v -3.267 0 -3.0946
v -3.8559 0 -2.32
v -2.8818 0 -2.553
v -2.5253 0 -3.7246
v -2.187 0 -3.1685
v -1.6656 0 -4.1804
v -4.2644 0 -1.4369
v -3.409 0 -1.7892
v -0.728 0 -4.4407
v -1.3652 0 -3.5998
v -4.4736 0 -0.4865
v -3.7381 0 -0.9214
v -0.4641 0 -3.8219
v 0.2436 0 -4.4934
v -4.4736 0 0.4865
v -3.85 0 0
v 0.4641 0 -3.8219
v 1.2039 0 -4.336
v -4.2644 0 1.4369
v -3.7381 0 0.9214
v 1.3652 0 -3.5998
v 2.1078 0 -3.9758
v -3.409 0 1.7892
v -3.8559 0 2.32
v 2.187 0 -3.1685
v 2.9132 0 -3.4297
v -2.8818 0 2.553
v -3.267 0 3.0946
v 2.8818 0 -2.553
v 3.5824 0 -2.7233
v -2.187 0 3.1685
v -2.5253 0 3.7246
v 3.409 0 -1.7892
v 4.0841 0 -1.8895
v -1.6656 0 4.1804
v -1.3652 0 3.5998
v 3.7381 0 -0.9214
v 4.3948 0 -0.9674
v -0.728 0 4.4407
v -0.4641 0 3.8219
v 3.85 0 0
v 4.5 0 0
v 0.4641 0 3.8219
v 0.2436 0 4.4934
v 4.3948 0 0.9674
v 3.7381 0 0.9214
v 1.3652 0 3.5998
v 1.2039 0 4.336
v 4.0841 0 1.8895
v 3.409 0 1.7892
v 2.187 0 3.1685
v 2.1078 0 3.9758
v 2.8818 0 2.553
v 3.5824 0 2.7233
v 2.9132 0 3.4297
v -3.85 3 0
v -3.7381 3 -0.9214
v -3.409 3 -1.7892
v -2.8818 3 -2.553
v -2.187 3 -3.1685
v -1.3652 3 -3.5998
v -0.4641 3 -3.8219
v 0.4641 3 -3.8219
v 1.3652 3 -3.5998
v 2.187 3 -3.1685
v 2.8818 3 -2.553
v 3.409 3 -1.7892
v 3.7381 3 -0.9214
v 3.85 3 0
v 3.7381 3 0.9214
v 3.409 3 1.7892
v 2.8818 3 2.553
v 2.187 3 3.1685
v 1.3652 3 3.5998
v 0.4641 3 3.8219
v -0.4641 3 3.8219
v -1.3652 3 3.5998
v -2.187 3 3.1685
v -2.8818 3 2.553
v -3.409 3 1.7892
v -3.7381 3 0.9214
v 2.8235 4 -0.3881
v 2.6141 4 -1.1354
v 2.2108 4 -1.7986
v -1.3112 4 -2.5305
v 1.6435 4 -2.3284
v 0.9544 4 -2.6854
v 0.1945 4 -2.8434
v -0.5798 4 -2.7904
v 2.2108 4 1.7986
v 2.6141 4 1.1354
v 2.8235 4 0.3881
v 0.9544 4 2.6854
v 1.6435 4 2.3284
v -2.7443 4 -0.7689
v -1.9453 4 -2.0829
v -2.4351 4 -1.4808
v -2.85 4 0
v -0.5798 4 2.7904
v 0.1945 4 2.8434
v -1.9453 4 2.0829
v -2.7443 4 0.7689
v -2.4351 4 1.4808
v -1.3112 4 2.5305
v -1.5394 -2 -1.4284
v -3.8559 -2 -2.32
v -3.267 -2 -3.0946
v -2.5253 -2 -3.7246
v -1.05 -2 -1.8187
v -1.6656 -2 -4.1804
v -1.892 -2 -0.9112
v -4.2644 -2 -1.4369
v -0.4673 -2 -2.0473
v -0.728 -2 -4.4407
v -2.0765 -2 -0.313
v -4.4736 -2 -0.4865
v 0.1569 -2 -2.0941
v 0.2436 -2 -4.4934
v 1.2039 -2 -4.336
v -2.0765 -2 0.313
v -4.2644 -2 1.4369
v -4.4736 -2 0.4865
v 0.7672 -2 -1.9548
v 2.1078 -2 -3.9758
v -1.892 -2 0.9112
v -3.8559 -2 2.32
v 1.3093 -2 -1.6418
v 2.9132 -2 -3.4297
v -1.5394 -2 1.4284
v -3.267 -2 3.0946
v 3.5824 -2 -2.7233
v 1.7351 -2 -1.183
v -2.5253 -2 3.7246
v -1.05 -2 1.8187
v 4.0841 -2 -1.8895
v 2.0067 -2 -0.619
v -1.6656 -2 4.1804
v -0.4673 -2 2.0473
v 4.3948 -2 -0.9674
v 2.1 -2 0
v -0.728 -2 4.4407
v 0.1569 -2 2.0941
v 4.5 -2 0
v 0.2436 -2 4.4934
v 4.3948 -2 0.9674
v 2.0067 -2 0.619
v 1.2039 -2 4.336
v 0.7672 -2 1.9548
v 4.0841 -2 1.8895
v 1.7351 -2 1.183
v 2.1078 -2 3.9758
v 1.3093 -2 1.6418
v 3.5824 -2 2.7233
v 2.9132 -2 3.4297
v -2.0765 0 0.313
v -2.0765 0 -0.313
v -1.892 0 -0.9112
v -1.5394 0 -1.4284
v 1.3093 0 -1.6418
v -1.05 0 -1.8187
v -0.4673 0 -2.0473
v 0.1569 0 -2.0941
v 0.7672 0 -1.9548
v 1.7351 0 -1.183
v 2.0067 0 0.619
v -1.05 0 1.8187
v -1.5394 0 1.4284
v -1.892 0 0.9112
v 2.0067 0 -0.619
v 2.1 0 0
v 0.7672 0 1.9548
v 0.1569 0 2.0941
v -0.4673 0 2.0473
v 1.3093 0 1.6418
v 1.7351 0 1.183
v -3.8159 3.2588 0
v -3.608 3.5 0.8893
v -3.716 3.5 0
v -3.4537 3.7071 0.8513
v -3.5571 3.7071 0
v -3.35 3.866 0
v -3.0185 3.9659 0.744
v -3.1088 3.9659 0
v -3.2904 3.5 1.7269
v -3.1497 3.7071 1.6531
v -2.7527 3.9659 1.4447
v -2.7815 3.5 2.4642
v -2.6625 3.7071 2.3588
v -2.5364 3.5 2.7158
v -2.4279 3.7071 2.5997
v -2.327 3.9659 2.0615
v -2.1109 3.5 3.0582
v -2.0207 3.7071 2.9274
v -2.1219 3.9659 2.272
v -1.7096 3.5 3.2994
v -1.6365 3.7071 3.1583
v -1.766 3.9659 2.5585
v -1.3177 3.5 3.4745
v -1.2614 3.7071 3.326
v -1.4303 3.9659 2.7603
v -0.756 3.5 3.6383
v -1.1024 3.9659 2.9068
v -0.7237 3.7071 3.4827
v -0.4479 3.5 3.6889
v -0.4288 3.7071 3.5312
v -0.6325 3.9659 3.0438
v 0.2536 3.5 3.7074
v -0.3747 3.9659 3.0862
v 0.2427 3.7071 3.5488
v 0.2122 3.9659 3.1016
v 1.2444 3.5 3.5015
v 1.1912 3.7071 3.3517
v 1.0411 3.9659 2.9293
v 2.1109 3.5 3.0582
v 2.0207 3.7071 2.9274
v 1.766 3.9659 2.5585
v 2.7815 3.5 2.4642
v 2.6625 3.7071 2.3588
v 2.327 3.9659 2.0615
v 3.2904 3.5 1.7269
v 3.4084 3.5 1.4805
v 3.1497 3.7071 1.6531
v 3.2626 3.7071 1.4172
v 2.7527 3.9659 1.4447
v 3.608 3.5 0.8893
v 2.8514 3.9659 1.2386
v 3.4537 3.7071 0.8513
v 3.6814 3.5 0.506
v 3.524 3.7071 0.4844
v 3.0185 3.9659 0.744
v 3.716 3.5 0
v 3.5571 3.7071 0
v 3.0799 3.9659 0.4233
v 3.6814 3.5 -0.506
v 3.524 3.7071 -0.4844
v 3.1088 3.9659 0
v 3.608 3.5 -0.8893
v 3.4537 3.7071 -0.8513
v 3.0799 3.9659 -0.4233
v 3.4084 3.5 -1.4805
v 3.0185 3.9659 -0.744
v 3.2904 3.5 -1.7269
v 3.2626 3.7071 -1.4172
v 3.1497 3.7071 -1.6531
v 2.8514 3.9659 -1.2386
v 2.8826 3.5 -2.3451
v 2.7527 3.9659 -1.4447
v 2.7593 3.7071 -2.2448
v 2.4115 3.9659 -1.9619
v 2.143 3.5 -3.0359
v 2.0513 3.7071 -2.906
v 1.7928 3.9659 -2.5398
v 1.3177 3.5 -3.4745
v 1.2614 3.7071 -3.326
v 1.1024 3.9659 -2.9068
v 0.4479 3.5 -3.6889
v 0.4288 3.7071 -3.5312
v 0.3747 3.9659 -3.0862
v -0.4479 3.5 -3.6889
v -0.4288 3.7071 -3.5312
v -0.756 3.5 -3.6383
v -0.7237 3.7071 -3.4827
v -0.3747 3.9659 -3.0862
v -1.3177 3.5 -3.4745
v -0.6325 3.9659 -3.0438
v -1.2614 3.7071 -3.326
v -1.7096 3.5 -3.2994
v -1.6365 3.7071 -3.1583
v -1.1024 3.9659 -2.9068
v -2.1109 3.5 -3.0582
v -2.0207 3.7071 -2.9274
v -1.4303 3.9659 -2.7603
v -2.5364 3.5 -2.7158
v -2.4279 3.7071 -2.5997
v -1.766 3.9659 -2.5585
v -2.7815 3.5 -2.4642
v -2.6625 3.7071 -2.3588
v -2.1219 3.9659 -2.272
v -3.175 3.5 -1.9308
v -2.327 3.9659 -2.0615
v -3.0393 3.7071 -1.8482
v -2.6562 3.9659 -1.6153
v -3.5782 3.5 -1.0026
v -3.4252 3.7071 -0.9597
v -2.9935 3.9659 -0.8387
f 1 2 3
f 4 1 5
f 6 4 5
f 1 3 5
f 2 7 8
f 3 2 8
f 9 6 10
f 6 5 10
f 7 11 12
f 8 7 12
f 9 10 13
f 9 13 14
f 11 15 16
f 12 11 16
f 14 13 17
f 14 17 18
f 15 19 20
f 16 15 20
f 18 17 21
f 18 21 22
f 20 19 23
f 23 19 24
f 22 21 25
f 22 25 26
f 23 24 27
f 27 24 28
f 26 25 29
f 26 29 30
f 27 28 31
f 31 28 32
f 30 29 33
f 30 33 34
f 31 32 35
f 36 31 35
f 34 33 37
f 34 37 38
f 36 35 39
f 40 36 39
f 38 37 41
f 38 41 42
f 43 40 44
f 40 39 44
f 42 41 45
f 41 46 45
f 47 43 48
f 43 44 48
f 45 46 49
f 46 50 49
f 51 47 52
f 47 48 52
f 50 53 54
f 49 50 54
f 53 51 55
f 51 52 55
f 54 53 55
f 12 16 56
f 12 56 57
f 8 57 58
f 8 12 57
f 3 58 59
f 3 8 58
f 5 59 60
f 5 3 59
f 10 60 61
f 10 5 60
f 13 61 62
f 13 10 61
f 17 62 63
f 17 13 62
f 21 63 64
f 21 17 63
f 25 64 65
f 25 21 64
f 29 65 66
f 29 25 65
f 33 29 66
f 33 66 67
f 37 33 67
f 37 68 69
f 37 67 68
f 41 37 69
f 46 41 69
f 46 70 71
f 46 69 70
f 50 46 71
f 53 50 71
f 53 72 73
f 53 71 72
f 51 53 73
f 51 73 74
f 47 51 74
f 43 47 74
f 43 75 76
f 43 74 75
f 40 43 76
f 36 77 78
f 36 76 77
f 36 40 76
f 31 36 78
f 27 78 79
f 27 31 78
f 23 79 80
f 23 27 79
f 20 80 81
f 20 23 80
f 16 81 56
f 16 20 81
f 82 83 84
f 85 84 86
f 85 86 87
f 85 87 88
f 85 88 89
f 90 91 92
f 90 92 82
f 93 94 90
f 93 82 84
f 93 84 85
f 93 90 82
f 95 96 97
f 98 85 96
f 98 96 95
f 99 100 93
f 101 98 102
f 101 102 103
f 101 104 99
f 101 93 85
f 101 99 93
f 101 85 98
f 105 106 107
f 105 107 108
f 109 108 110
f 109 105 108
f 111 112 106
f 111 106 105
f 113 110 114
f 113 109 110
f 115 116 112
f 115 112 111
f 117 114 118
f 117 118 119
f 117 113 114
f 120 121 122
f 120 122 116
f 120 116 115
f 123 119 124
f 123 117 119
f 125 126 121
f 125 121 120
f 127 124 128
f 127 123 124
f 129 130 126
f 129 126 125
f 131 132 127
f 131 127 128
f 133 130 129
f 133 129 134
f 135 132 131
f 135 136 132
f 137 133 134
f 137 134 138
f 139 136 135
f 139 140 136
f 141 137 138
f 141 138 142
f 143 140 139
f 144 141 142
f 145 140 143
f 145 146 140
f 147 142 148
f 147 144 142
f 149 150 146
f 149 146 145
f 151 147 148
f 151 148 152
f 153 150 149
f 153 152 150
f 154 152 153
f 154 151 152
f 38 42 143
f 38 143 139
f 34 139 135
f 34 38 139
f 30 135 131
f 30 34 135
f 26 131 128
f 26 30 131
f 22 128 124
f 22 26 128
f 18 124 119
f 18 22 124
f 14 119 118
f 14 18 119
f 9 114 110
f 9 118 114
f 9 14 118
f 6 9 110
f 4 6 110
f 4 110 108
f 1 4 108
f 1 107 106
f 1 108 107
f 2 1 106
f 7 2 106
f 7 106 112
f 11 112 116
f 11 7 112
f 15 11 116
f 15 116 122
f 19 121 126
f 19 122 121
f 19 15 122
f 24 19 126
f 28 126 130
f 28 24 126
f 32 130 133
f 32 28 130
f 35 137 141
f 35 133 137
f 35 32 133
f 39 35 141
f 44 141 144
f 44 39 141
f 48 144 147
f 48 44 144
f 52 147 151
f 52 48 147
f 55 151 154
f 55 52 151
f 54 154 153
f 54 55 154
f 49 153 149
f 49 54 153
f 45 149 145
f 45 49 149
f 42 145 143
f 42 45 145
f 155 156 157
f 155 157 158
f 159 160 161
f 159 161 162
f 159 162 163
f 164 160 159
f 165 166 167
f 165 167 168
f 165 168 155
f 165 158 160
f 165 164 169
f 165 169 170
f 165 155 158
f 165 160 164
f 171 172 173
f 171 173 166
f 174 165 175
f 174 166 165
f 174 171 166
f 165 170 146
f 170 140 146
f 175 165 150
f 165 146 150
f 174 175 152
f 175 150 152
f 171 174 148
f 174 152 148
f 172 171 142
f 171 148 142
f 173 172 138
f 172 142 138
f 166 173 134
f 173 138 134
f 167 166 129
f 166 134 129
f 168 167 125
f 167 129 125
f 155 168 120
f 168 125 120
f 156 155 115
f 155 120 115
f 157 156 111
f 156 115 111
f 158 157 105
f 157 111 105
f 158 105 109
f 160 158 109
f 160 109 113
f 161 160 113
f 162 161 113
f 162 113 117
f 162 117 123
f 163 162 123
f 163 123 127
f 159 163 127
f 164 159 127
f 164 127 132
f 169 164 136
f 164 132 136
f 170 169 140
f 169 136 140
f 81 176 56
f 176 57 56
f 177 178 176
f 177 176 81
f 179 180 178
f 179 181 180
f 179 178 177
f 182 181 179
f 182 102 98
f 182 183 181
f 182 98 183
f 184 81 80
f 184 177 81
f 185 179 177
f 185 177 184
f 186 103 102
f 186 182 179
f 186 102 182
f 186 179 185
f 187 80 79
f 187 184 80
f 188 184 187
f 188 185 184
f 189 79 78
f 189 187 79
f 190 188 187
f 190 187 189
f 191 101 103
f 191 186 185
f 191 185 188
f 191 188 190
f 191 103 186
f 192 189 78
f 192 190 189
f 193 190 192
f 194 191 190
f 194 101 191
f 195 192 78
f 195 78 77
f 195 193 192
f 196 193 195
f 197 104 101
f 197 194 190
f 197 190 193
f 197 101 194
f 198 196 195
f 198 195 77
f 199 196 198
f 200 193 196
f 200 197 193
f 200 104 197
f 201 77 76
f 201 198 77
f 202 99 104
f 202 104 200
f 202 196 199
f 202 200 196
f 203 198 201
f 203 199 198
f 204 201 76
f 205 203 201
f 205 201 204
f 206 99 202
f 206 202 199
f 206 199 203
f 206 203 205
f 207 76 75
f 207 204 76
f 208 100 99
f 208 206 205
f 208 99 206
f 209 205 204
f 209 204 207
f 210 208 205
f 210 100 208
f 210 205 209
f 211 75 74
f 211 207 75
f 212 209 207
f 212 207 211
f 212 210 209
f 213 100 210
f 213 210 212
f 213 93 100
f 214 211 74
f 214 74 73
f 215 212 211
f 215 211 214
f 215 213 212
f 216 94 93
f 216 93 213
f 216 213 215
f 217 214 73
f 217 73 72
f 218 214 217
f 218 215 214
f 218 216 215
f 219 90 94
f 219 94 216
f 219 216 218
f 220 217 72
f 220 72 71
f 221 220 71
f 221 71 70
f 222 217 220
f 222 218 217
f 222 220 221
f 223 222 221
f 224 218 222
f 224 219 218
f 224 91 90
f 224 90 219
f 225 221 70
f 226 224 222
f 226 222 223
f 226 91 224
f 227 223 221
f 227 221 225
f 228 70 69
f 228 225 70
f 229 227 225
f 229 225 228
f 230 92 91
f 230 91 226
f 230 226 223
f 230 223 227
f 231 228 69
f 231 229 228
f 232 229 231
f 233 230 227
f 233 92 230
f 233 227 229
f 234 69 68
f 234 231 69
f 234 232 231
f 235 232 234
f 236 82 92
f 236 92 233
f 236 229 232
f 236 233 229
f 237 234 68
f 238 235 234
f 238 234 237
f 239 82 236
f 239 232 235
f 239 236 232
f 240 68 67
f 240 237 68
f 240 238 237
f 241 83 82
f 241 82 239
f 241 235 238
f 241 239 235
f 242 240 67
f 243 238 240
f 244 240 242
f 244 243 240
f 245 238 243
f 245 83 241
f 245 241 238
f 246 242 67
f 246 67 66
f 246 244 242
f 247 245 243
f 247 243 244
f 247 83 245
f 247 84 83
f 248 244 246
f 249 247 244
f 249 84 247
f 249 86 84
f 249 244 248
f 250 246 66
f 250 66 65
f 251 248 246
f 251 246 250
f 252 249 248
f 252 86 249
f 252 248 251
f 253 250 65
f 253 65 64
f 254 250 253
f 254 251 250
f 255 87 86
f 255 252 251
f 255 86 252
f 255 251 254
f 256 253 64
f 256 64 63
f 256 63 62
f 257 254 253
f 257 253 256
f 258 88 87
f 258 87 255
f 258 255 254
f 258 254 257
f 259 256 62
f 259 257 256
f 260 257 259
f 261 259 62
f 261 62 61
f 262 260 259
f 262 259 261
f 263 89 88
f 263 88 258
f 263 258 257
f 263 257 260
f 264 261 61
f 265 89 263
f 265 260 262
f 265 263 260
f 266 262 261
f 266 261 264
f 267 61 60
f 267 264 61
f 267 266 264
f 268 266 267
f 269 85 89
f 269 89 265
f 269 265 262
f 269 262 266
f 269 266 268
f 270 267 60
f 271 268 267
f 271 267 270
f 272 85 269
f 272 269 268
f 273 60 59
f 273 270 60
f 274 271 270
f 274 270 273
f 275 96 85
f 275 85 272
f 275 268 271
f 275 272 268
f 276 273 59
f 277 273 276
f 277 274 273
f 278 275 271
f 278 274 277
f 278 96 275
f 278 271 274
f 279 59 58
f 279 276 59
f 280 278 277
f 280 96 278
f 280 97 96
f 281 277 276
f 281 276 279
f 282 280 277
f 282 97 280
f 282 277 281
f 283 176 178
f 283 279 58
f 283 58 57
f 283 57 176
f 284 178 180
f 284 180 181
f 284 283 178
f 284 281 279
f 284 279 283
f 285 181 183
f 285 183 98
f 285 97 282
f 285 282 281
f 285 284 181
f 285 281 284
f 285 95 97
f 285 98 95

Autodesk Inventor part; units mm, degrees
ref_plane "YZ Plane" through (0, 0, 0) normal (1, 0, 0) x (0, 1, 0)
ref_plane "XZ Plane" through (0, 0, 0) normal (0, 1, 0) x (-1, 0, 0)
ref_plane "XY Plane" through (0, 0, 0) normal (0, 0, 1) x (1, 0, 0)
sketch "Sketch1" plane through (0, 0, 0) normal (0, 1, 0) x (-1, 0, 0)
  circle A0 centre (0, 0) radius 3.85
  dimension "d0" = 7.7
extrude "Extrusion1" add sketch "Sketch1" along normal blind 4
fillet "Fillet1" radius 1 1 edges at (3.85, 4, 0)
sketch "Sketch2" plane through (0, 0, 0) normal (0, -1, 0) x (1, 0, 0)
  circle A0 centre (0, 0) radius 4.5
  dimension "d4" = 9
extrude "Extrusion2" add sketch "Sketch2" along normal blind 2
sketch "Sketch3" plane through (0, -2, 0) normal (0, -1, 0) x (1, 0, 0)
  circle A0 centre (0, 0) radius 2.1
  dimension "d7" = 4.2
extrude "Extrusion3" cut sketch "Sketch3" against normal blind 2
properties part number "tlacitko"
